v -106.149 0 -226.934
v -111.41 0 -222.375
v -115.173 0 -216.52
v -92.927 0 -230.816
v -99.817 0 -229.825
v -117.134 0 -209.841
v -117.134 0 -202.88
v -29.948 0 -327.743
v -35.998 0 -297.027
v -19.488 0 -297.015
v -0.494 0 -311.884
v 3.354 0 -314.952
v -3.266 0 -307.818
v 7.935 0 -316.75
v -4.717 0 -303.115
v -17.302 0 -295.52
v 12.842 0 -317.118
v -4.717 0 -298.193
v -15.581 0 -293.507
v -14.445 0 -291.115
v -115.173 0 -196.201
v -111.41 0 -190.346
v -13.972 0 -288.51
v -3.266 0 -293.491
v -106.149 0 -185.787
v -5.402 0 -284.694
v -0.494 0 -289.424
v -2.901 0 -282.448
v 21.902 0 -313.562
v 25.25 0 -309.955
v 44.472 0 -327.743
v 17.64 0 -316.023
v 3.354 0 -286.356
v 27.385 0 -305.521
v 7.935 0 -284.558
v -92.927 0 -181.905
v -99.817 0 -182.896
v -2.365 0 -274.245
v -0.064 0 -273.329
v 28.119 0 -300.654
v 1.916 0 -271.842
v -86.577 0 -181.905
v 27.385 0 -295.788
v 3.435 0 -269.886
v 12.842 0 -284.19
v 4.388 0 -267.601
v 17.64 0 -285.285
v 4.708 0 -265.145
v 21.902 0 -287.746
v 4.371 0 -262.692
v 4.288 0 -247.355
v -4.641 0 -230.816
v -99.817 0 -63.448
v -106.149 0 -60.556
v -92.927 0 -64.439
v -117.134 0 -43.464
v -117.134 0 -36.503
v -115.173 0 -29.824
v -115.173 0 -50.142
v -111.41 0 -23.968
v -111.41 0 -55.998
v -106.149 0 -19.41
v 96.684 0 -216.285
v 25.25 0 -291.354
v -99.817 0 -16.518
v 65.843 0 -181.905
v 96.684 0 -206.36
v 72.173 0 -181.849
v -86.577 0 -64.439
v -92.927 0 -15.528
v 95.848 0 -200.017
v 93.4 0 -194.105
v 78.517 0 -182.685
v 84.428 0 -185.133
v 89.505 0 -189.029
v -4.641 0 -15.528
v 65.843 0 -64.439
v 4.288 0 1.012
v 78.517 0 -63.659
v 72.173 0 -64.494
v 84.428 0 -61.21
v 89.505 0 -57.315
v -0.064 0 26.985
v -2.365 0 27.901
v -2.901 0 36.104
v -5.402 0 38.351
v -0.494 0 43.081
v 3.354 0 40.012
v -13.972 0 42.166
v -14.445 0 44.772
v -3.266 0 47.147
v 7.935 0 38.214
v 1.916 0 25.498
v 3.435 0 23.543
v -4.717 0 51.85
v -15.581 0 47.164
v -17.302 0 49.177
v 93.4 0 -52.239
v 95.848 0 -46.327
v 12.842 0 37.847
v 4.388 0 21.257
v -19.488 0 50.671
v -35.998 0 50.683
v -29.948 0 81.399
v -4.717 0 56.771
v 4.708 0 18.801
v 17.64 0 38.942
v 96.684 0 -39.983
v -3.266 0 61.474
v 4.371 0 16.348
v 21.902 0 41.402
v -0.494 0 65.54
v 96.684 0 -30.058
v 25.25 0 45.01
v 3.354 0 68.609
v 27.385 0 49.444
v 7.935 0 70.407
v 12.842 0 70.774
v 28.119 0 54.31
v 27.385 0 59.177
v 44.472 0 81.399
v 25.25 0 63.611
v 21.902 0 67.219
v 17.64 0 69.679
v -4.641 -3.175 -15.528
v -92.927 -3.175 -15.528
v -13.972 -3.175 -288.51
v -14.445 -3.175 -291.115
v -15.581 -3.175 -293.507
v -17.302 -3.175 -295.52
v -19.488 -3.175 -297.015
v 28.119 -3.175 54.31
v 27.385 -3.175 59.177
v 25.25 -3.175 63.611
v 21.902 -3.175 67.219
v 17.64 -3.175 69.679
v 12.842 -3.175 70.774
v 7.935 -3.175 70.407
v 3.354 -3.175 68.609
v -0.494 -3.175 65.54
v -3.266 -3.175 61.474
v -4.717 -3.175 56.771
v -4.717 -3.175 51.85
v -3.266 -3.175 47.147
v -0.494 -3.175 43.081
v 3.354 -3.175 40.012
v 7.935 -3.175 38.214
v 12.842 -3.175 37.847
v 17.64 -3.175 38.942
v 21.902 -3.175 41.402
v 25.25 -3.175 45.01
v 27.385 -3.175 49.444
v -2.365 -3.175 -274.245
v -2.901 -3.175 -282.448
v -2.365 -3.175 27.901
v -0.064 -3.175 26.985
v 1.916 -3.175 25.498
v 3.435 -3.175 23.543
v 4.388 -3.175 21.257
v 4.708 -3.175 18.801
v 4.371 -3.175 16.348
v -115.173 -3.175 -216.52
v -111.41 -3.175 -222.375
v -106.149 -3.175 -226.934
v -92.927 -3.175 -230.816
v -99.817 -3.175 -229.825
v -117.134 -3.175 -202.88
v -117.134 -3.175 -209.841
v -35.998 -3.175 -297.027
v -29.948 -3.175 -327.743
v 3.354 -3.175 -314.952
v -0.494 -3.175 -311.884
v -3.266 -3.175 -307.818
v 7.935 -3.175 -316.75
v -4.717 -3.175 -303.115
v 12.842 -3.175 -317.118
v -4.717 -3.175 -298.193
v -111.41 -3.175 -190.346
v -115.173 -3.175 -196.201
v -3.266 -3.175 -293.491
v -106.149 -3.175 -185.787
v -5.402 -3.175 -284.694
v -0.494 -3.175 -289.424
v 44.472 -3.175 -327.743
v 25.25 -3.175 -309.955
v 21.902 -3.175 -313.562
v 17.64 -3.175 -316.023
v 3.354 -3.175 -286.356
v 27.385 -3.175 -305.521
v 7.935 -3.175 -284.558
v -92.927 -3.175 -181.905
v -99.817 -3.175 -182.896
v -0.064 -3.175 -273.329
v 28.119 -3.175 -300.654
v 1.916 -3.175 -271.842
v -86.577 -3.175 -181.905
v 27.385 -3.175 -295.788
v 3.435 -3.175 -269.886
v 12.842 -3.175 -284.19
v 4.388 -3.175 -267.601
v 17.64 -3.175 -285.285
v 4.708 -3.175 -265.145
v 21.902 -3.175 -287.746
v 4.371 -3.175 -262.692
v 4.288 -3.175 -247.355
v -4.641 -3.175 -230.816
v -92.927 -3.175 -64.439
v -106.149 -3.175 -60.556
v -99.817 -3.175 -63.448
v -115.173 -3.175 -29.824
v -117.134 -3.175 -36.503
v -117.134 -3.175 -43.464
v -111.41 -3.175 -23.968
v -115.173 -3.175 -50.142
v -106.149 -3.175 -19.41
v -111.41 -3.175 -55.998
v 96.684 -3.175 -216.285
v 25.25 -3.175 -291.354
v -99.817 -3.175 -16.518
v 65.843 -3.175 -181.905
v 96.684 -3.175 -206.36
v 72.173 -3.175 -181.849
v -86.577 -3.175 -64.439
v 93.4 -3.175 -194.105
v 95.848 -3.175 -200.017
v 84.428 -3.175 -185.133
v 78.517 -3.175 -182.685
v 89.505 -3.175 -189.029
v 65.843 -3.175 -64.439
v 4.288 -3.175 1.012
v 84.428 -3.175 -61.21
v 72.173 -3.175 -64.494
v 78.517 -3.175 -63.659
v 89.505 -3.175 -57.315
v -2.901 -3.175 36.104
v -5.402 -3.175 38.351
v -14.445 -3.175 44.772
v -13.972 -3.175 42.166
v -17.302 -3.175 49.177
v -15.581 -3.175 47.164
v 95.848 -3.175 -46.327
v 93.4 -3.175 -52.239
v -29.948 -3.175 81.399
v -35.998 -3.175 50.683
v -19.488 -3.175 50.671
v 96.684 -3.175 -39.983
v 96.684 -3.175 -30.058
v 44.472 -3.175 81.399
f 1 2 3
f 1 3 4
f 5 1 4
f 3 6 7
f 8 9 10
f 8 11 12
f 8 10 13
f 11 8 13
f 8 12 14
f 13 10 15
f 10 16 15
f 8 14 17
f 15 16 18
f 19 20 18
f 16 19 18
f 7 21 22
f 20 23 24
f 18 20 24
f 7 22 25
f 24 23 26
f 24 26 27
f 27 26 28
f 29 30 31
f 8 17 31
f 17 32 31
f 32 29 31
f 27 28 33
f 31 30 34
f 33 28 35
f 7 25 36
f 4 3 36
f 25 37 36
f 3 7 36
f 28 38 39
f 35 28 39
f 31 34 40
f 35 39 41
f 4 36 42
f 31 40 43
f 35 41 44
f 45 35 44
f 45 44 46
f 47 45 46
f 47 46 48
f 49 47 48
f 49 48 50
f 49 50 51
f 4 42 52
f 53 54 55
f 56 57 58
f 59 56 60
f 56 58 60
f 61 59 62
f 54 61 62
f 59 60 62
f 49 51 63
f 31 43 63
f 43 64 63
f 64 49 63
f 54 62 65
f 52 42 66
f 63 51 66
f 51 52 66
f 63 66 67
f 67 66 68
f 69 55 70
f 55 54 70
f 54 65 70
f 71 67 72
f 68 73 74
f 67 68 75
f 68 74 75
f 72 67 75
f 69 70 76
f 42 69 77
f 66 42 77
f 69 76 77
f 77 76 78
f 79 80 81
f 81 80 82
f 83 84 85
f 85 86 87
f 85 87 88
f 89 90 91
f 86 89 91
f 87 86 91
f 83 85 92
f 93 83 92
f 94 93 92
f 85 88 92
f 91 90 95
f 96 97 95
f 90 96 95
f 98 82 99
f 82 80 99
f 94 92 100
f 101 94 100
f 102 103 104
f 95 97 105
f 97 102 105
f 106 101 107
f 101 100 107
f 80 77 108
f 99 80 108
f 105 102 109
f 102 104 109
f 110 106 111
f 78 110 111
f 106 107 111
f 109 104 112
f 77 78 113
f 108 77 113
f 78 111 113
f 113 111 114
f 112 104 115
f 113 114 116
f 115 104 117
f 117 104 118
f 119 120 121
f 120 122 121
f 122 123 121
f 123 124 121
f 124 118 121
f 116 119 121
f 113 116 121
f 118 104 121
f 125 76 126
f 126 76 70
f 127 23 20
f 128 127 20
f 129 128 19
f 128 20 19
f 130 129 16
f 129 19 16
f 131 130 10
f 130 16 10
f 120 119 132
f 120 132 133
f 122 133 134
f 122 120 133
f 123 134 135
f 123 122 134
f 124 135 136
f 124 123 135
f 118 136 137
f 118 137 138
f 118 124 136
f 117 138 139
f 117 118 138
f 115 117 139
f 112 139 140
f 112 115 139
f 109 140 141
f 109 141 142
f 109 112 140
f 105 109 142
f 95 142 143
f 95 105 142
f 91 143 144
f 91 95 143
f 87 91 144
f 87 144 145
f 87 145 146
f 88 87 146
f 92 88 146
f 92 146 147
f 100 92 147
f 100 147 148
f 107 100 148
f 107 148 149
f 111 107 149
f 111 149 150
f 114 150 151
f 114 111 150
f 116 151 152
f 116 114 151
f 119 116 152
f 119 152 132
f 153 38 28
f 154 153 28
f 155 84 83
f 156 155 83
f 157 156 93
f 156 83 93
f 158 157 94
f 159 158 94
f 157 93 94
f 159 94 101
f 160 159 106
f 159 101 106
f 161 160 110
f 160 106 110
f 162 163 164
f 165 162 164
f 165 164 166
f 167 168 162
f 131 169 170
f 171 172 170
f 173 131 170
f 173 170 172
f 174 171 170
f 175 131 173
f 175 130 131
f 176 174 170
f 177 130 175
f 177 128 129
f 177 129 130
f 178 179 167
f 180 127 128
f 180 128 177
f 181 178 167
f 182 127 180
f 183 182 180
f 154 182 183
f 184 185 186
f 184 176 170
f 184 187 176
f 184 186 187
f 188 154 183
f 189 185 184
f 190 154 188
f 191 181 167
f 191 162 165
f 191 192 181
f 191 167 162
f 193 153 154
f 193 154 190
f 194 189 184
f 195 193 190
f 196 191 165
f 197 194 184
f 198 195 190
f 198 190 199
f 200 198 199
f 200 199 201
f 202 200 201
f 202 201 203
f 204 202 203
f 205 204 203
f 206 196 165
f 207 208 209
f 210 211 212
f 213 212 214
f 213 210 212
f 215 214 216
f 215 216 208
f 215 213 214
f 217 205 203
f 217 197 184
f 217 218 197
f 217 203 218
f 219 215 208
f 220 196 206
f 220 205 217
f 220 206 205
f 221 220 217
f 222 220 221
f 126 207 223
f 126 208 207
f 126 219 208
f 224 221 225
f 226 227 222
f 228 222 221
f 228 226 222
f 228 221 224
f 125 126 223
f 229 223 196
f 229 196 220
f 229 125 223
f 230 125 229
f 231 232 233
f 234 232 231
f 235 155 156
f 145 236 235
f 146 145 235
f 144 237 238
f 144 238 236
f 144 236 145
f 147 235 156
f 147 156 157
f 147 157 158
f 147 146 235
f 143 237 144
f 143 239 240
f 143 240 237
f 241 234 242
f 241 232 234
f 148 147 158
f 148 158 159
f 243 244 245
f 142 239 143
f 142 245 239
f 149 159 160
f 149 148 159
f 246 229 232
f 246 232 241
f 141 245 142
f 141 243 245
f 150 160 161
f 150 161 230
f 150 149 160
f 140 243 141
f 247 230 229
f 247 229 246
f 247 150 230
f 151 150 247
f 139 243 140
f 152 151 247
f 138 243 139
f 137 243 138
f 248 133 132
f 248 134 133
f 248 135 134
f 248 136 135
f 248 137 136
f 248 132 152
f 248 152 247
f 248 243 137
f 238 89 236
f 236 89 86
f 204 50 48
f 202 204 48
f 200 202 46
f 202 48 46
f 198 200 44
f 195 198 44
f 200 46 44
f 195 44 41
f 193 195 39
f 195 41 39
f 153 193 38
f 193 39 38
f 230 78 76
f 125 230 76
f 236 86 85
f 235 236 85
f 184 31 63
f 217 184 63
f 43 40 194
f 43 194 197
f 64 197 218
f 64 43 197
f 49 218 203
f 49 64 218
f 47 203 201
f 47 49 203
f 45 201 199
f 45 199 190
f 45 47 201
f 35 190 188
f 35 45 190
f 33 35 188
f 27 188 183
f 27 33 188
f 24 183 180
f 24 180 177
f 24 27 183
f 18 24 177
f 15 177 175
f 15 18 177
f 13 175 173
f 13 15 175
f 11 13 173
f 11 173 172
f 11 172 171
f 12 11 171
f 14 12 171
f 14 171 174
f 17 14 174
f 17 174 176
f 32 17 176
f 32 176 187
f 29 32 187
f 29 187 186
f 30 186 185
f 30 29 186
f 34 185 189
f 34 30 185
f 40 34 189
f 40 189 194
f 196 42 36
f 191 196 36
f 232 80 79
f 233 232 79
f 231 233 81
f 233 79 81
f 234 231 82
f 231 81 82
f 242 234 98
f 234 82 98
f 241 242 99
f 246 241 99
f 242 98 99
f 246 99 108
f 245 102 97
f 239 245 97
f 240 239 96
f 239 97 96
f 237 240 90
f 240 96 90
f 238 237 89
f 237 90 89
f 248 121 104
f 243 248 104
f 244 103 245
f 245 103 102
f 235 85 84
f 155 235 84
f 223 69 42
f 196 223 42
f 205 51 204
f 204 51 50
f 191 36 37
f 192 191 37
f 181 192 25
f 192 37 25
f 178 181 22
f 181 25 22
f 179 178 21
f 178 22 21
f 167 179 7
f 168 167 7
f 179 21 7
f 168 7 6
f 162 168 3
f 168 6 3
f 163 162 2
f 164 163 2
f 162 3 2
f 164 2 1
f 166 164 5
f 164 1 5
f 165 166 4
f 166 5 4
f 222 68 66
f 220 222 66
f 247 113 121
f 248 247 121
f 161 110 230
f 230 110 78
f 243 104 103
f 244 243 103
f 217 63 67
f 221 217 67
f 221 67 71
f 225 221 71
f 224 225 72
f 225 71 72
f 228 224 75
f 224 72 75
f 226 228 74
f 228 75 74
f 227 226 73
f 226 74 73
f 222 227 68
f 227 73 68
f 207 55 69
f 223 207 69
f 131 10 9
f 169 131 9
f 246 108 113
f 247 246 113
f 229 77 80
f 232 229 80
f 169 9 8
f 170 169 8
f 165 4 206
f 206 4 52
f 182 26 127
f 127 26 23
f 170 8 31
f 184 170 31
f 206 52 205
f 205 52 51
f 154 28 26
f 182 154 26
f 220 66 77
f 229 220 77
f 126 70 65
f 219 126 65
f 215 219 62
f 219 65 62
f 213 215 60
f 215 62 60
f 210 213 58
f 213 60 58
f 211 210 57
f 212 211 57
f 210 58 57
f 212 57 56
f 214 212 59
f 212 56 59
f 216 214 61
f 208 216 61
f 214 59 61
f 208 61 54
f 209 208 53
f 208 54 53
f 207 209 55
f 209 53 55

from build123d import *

# Parameters (mm, degrees)
F0_R     = 16.51
F0_W     = 152.420665353
F0_H     = 90.8812
F1_DEPTH = 3.175


# Not quite as in the source:
# - ends of sketch curves that miss each other by under 0.0002 mm in the source are joined
# - a feature names something its author has since deleted; it is built from what else it names


with BuildPart() as f1:
    # F0 (on Front) → F1 (new body)
    with BuildSketch(Plane.XZ):
        with BuildLine():
            Line((65.843271404, -64.4387074201), (72.172606051, -64.494198626))
            ThreePointArc((72.172606051, -64.494198626), (89.5045003647, -57.3150929397), (96.683606051, -39.983198626))
            Line((96.683606051, -39.983198626), (96.683606051, -30.0584486086))
            Line((96.683606051, -30.0584486086), (44.4719158113, 81.3992435336))
            Line((44.4719158113, 81.3992435336), (-29.9480052508, 81.3992435336))
            Line((-29.9480052508, 81.3992435336), (-35.9978974571, 50.6829957967))
            Line((-35.9978974571, 50.6829957967), (-19.4879078689, 50.6714224456))
            ThreePointArc((-19.4879078689, 50.6714224456), (-15.5812211009, 47.1637298884), (-13.9720730804, 42.1660573792))
            Line((-13.9720730804, 42.1660573792), (-5.4024819992, 38.3506346508))
            Line((-5.4024819992, 38.3506346508), (-2.9009456417, 36.1038269705))
            Line((-2.9009456417, 36.1038269705), (-2.3647786124, 27.9011076368))
            ThreePointArc((-2.3647786124, 27.9011076368), (3.4353485173, 23.5426794776), (4.3712937617, 16.3481414632))
            Line((4.3712937617, 16.3481414632), (4.2880776677, 1.0115236557))
            Line((4.2880776677, 1.0115236557), (-4.6405893252, -15.5276898319))
            Line((-4.6405893252, -15.5276898319), (-92.927393949, -15.5276898319))
            ThreePointArc((-92.927393949, -15.5276898319), (-117.3829027431, -39.983198626), (-92.927393949, -64.4387074201))
            Line((-92.927393949, -64.4387074201), (-86.577393949, -64.4387074201))
            Line((-86.577393949, -64.4387074201), (-86.577393949, -77.7312386201))
            Line((-86.577393949, -77.7312386201), (65.843271404, -77.7312386201))
            Line((65.843271404, -77.7312386201), (65.843271404, -64.4387074201))
        make_face()
        with Locations((11.6086210255, 54.3104703533)):
            Circle(F0_R, mode=Mode.SUBTRACT)
        with Locations((-10.3670612725, -123.1718386201)):
            Rectangle(F0_W, F0_H)
        with BuildLine():
            Line((65.843271404, -181.9049698201), (65.843271404, -168.6124386201))
            Line((65.843271404, -168.6124386201), (-86.577393949, -168.6124386201))
            Line((-86.577393949, -168.6124386201), (-86.577393949, -181.9049698201))
            Line((-86.577393949, -181.9049698201), (-92.927393949, -181.9049698201))
            ThreePointArc((-92.927393949, -181.9049698201), (-117.3829027431, -206.3604786142), (-92.927393949, -230.8159874083))
            Line((-92.927393949, -230.8159874083), (-4.6405893252, -230.8159874083))
            Line((-4.6405893252, -230.8159874083), (4.2880776677, -247.355200896))
            Line((4.2880776677, -247.355200896), (4.3712937617, -262.6918187035))
            ThreePointArc((4.3712937617, -262.6918187035), (3.4353485173, -269.8863567179), (-2.3647786124, -274.2447848771))
            Line((-2.3647786124, -274.2447848771), (-2.9009456417, -282.4475042108))
            Line((-2.9009456417, -282.4475042108), (-5.4024819992, -284.6943118911))
            Line((-5.4024819992, -284.6943118911), (-13.9720735102, -288.5097398532))
            ThreePointArc((-13.9720735102, -288.5097398532), (-15.5812211009, -293.5074071287), (-19.487905219, -297.0150996841))
            Line((-19.487905219, -297.0150996841), (-35.9978974571, -297.026673037))
            Line((-35.9978974571, -297.026673037), (-29.9480052508, -327.7429207739))
            Line((-29.9480052508, -327.7429207739), (44.4719158113, -327.7429207739))
            Line((44.4719158113, -327.7429207739), (96.683606051, -216.2852286317))
            Line((96.683606051, -216.2852286317), (96.683606051, -206.3604786142))
            ThreePointArc((96.683606051, -206.3604786142), (89.5045003647, -189.0285843006), (72.172606051, -181.8494786142))
            Line((72.172606051, -181.8494786142), (65.843271404, -181.9049698201))
        make_face()
        with Locations((11.6086210255, -300.6541475936)):
            Circle(F0_R, mode=Mode.SUBTRACT)
    extrude(amount=F1_DEPTH)


solid = f1.part
